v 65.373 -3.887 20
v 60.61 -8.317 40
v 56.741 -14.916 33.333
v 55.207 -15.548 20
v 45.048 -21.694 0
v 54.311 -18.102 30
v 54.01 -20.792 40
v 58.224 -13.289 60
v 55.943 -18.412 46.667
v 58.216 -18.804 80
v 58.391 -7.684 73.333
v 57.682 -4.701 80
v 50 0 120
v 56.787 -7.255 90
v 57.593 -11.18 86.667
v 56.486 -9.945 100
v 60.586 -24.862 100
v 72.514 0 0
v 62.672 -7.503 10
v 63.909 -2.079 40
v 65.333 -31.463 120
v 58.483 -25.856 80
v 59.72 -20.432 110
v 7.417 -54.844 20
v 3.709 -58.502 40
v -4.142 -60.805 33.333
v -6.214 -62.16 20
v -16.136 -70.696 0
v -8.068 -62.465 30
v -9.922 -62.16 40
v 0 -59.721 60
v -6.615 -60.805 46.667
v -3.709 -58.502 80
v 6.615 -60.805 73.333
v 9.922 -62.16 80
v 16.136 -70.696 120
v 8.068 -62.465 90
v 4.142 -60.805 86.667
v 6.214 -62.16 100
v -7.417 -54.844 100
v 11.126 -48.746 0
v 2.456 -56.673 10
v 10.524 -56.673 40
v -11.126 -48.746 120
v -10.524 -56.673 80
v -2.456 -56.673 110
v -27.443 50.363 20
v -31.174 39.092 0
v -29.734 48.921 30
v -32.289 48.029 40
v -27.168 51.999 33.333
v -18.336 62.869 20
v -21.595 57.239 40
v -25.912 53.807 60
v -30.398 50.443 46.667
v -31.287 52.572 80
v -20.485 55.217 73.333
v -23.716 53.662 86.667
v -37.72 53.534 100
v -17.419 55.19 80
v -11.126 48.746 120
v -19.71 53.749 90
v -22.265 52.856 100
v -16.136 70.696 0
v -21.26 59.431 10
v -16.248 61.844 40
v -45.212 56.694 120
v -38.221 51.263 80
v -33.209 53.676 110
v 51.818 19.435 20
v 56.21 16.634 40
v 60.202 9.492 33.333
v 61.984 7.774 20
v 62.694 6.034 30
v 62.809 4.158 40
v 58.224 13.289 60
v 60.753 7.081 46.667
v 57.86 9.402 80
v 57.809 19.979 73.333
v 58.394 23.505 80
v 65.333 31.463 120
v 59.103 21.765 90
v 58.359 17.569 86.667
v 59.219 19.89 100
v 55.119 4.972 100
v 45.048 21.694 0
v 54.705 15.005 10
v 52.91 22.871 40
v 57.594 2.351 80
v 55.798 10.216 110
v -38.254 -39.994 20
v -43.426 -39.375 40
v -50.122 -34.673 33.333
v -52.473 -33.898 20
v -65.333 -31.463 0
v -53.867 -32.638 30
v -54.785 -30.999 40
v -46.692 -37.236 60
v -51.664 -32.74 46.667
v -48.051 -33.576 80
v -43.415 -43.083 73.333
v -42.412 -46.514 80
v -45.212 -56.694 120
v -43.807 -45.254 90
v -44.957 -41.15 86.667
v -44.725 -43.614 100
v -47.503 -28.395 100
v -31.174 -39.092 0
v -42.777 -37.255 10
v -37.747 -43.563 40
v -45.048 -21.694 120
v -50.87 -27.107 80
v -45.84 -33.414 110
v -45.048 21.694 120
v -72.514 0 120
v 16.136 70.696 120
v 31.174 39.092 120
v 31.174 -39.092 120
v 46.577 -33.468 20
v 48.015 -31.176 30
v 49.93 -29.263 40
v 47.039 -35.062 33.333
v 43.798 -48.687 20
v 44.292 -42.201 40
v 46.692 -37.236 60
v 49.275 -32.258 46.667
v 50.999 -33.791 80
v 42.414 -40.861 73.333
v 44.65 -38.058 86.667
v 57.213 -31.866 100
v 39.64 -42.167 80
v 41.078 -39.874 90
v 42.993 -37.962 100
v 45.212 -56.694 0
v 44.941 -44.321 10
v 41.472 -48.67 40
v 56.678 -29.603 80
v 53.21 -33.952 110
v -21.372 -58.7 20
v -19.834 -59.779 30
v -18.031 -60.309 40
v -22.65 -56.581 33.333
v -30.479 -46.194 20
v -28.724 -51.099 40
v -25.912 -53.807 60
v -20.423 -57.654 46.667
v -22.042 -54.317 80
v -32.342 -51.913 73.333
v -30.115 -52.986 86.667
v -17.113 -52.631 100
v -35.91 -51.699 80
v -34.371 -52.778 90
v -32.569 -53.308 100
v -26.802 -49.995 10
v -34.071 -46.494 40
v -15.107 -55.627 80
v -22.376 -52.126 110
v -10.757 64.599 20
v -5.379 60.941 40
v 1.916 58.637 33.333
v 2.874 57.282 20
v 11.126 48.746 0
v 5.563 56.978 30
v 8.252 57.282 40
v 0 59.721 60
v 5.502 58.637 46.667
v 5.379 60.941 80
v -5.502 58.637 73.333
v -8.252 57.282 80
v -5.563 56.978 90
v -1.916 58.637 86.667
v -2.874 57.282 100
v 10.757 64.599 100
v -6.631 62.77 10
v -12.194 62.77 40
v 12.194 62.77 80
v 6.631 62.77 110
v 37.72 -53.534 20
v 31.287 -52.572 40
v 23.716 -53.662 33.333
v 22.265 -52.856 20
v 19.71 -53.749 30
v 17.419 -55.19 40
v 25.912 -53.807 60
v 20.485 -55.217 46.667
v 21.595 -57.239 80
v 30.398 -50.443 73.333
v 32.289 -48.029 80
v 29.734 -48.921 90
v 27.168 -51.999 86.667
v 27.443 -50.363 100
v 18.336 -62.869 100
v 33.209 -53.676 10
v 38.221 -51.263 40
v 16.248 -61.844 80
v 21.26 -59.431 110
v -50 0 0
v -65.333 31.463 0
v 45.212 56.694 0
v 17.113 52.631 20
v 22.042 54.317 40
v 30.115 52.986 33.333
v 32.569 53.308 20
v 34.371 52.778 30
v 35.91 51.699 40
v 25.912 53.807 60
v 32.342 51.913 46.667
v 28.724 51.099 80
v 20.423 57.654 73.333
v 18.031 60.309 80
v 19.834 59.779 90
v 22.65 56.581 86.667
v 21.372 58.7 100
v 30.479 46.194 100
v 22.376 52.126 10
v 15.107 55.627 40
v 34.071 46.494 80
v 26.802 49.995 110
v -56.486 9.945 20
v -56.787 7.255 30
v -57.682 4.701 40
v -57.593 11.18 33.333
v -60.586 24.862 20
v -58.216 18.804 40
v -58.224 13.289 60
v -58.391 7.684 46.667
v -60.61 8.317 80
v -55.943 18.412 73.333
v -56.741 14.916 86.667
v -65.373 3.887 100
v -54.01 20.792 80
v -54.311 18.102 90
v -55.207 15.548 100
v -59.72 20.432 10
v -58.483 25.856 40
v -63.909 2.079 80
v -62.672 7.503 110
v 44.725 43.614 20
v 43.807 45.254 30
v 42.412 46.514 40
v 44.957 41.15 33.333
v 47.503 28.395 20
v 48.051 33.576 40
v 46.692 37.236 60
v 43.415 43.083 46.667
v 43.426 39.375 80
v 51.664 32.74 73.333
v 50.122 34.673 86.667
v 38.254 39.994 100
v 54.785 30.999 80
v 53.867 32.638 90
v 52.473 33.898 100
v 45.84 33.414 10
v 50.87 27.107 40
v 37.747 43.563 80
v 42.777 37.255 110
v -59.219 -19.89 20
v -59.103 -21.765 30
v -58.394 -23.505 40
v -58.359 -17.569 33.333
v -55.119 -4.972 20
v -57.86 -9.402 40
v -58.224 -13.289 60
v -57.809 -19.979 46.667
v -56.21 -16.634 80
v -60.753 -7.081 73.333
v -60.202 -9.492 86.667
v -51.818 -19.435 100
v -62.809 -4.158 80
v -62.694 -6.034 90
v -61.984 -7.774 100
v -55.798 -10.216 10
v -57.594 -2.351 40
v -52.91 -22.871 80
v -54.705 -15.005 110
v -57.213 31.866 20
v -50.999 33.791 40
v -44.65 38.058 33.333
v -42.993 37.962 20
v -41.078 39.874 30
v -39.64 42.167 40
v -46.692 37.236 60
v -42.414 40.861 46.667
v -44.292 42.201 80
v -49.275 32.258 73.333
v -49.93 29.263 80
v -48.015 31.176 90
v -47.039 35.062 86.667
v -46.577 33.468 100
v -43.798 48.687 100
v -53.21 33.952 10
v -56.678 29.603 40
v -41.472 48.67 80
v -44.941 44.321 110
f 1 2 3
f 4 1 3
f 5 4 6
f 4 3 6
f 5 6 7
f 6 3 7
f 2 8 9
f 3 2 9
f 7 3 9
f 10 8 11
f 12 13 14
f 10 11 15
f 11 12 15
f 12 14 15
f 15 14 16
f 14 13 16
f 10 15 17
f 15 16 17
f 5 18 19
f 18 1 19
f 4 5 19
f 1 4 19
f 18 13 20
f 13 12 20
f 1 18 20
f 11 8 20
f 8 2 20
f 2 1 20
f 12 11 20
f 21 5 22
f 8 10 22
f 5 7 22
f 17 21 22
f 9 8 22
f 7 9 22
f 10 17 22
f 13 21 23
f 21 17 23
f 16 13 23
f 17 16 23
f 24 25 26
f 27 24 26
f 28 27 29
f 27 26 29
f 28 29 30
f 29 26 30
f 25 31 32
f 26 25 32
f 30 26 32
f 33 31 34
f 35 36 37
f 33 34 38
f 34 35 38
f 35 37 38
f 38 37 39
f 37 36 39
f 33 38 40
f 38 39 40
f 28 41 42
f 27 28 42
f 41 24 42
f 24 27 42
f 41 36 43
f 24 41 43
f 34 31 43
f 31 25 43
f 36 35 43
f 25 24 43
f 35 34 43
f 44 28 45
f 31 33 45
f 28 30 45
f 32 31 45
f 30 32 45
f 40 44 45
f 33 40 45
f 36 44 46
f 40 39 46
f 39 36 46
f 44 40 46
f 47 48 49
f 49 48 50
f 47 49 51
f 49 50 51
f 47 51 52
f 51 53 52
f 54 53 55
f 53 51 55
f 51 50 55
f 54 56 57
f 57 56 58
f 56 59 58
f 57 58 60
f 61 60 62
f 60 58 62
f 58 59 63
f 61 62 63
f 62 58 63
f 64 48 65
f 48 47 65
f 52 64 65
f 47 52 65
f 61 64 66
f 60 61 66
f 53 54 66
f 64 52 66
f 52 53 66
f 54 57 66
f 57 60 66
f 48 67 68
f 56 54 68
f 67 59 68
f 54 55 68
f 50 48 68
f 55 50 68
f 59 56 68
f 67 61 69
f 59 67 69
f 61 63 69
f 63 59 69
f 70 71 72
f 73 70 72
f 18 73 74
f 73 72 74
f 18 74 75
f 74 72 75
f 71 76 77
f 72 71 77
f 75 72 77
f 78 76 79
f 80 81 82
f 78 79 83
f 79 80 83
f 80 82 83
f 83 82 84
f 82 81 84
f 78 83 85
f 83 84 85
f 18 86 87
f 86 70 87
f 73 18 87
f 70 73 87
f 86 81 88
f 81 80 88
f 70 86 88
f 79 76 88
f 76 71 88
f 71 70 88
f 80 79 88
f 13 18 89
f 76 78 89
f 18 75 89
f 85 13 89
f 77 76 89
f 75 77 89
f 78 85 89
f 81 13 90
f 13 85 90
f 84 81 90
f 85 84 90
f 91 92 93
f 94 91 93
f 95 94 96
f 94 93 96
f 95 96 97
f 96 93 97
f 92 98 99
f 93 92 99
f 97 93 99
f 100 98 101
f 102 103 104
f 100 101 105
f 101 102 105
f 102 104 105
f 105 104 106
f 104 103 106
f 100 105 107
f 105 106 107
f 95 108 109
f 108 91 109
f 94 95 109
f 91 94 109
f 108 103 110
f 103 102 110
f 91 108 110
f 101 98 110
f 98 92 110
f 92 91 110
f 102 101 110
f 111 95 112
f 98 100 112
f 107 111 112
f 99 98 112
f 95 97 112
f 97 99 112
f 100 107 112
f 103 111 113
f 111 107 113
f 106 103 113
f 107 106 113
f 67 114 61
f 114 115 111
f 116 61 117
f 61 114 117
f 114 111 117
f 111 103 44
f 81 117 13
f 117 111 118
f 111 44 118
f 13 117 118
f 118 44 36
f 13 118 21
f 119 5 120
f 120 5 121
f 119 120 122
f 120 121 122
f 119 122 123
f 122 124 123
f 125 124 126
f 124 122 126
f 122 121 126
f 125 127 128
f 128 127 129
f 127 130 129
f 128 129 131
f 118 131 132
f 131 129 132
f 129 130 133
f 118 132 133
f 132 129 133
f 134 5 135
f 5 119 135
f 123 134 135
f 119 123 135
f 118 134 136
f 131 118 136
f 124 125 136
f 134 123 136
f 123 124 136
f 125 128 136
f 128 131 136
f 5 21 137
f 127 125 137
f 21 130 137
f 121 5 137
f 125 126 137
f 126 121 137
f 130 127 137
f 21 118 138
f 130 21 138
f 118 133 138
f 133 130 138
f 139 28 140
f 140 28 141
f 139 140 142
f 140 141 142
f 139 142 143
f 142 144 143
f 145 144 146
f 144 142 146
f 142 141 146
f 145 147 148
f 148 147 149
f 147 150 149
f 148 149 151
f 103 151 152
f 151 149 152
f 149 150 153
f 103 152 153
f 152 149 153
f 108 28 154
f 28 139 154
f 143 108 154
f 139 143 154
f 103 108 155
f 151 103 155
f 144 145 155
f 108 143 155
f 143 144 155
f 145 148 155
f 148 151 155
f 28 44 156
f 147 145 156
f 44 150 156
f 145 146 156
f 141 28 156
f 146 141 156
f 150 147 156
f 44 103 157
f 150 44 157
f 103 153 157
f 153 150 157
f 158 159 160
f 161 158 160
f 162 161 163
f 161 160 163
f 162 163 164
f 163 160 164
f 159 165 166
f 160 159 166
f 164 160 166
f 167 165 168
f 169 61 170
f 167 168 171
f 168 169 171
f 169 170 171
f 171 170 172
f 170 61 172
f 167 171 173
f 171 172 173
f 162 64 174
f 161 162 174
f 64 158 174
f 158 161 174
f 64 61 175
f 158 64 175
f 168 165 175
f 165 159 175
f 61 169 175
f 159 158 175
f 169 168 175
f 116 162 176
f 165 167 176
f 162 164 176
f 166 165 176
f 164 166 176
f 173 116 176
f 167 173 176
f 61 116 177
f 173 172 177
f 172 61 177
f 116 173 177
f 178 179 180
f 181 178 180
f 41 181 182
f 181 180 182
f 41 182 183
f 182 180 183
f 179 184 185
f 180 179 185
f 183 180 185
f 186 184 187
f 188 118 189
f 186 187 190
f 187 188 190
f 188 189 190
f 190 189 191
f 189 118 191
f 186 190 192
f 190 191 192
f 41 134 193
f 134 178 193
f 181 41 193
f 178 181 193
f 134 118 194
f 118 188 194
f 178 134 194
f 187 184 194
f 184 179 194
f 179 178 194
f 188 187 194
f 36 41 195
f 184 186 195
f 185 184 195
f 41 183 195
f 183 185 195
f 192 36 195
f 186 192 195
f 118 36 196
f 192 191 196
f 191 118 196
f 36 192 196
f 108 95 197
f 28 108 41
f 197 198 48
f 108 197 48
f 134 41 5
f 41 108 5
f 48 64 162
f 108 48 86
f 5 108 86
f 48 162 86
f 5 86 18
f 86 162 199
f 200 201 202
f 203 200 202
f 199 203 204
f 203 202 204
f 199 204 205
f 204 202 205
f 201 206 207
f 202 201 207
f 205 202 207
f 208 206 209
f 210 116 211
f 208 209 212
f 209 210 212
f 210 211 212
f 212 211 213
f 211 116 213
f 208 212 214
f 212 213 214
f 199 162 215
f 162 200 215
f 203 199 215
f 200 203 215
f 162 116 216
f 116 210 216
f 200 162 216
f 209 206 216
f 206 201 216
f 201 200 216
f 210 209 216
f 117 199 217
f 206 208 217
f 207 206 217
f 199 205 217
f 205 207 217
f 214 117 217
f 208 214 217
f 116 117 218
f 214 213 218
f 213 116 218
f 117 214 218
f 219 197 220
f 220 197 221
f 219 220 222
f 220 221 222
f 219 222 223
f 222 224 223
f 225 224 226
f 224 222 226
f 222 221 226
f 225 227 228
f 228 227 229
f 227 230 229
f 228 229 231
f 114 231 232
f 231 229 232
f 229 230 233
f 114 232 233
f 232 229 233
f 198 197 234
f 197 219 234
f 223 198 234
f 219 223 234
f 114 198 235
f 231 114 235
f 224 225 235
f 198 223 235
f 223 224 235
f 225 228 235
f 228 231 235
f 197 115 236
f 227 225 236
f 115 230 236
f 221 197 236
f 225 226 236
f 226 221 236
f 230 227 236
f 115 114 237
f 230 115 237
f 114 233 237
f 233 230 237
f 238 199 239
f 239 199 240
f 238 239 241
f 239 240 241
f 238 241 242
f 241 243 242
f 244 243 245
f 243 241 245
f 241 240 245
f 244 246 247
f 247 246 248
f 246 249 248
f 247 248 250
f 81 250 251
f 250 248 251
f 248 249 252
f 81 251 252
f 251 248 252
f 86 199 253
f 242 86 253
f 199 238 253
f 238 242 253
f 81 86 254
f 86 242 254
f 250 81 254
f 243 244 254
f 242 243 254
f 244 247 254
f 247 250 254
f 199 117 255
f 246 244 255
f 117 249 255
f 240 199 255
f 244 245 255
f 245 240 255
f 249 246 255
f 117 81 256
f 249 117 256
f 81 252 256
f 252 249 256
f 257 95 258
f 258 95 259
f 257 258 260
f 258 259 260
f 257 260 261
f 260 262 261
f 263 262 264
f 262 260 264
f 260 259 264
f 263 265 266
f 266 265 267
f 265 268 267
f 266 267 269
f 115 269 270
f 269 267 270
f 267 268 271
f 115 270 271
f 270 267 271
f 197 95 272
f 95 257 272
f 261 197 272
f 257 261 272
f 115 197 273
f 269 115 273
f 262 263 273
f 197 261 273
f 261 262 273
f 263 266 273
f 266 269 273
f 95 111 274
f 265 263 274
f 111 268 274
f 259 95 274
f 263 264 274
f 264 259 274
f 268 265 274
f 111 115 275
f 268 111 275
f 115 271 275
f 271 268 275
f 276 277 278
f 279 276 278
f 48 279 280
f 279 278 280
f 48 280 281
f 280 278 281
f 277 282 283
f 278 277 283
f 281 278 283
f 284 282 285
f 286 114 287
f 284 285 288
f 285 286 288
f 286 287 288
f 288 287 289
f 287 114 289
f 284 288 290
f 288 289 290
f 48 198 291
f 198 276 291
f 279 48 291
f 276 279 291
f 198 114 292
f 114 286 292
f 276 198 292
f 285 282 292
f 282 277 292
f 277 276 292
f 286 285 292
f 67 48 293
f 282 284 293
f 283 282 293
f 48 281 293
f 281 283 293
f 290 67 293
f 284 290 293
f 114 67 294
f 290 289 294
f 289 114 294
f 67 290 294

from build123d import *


with BuildPart() as part:
    # Sketch → AdditiveLoft section 0
    with BuildSketch(Plane.XY):
        Polygon((-50, 0), (-65.332946, 31.462689), (-31.17449, 39.091574), (-16.135905, 70.696019), (11.126047, 48.746396), (45.211801, 56.693806), (45.048443, 21.694187), (72.514099, 0), (45.048443, -21.694187), (45.211801, -56.693806), (11.126047, -48.746396), (-16.135905, -70.696019), (-31.17449, -39.091574), (-65.332946, -31.462689), align=None)
    # Sketch001 → AdditiveLoft section 1
    with BuildSketch(Plane.XY.offset(120)):
        Polygon((-45.048443, 21.694187), (-45.211801, 56.693806), (-11.126047, 48.746396), (16.135905, 70.696019), (31.17449, 39.091574), (65.332946, 31.462689), (50, 0), (65.332946, -31.462689), (31.17449, -39.091574), (16.135905, -70.696019), (-11.126047, -48.746396), (-45.211801, -56.693806), (-45.048443, -21.694187), (-72.514099, 0), align=None)
    loft()


solid = part.part
